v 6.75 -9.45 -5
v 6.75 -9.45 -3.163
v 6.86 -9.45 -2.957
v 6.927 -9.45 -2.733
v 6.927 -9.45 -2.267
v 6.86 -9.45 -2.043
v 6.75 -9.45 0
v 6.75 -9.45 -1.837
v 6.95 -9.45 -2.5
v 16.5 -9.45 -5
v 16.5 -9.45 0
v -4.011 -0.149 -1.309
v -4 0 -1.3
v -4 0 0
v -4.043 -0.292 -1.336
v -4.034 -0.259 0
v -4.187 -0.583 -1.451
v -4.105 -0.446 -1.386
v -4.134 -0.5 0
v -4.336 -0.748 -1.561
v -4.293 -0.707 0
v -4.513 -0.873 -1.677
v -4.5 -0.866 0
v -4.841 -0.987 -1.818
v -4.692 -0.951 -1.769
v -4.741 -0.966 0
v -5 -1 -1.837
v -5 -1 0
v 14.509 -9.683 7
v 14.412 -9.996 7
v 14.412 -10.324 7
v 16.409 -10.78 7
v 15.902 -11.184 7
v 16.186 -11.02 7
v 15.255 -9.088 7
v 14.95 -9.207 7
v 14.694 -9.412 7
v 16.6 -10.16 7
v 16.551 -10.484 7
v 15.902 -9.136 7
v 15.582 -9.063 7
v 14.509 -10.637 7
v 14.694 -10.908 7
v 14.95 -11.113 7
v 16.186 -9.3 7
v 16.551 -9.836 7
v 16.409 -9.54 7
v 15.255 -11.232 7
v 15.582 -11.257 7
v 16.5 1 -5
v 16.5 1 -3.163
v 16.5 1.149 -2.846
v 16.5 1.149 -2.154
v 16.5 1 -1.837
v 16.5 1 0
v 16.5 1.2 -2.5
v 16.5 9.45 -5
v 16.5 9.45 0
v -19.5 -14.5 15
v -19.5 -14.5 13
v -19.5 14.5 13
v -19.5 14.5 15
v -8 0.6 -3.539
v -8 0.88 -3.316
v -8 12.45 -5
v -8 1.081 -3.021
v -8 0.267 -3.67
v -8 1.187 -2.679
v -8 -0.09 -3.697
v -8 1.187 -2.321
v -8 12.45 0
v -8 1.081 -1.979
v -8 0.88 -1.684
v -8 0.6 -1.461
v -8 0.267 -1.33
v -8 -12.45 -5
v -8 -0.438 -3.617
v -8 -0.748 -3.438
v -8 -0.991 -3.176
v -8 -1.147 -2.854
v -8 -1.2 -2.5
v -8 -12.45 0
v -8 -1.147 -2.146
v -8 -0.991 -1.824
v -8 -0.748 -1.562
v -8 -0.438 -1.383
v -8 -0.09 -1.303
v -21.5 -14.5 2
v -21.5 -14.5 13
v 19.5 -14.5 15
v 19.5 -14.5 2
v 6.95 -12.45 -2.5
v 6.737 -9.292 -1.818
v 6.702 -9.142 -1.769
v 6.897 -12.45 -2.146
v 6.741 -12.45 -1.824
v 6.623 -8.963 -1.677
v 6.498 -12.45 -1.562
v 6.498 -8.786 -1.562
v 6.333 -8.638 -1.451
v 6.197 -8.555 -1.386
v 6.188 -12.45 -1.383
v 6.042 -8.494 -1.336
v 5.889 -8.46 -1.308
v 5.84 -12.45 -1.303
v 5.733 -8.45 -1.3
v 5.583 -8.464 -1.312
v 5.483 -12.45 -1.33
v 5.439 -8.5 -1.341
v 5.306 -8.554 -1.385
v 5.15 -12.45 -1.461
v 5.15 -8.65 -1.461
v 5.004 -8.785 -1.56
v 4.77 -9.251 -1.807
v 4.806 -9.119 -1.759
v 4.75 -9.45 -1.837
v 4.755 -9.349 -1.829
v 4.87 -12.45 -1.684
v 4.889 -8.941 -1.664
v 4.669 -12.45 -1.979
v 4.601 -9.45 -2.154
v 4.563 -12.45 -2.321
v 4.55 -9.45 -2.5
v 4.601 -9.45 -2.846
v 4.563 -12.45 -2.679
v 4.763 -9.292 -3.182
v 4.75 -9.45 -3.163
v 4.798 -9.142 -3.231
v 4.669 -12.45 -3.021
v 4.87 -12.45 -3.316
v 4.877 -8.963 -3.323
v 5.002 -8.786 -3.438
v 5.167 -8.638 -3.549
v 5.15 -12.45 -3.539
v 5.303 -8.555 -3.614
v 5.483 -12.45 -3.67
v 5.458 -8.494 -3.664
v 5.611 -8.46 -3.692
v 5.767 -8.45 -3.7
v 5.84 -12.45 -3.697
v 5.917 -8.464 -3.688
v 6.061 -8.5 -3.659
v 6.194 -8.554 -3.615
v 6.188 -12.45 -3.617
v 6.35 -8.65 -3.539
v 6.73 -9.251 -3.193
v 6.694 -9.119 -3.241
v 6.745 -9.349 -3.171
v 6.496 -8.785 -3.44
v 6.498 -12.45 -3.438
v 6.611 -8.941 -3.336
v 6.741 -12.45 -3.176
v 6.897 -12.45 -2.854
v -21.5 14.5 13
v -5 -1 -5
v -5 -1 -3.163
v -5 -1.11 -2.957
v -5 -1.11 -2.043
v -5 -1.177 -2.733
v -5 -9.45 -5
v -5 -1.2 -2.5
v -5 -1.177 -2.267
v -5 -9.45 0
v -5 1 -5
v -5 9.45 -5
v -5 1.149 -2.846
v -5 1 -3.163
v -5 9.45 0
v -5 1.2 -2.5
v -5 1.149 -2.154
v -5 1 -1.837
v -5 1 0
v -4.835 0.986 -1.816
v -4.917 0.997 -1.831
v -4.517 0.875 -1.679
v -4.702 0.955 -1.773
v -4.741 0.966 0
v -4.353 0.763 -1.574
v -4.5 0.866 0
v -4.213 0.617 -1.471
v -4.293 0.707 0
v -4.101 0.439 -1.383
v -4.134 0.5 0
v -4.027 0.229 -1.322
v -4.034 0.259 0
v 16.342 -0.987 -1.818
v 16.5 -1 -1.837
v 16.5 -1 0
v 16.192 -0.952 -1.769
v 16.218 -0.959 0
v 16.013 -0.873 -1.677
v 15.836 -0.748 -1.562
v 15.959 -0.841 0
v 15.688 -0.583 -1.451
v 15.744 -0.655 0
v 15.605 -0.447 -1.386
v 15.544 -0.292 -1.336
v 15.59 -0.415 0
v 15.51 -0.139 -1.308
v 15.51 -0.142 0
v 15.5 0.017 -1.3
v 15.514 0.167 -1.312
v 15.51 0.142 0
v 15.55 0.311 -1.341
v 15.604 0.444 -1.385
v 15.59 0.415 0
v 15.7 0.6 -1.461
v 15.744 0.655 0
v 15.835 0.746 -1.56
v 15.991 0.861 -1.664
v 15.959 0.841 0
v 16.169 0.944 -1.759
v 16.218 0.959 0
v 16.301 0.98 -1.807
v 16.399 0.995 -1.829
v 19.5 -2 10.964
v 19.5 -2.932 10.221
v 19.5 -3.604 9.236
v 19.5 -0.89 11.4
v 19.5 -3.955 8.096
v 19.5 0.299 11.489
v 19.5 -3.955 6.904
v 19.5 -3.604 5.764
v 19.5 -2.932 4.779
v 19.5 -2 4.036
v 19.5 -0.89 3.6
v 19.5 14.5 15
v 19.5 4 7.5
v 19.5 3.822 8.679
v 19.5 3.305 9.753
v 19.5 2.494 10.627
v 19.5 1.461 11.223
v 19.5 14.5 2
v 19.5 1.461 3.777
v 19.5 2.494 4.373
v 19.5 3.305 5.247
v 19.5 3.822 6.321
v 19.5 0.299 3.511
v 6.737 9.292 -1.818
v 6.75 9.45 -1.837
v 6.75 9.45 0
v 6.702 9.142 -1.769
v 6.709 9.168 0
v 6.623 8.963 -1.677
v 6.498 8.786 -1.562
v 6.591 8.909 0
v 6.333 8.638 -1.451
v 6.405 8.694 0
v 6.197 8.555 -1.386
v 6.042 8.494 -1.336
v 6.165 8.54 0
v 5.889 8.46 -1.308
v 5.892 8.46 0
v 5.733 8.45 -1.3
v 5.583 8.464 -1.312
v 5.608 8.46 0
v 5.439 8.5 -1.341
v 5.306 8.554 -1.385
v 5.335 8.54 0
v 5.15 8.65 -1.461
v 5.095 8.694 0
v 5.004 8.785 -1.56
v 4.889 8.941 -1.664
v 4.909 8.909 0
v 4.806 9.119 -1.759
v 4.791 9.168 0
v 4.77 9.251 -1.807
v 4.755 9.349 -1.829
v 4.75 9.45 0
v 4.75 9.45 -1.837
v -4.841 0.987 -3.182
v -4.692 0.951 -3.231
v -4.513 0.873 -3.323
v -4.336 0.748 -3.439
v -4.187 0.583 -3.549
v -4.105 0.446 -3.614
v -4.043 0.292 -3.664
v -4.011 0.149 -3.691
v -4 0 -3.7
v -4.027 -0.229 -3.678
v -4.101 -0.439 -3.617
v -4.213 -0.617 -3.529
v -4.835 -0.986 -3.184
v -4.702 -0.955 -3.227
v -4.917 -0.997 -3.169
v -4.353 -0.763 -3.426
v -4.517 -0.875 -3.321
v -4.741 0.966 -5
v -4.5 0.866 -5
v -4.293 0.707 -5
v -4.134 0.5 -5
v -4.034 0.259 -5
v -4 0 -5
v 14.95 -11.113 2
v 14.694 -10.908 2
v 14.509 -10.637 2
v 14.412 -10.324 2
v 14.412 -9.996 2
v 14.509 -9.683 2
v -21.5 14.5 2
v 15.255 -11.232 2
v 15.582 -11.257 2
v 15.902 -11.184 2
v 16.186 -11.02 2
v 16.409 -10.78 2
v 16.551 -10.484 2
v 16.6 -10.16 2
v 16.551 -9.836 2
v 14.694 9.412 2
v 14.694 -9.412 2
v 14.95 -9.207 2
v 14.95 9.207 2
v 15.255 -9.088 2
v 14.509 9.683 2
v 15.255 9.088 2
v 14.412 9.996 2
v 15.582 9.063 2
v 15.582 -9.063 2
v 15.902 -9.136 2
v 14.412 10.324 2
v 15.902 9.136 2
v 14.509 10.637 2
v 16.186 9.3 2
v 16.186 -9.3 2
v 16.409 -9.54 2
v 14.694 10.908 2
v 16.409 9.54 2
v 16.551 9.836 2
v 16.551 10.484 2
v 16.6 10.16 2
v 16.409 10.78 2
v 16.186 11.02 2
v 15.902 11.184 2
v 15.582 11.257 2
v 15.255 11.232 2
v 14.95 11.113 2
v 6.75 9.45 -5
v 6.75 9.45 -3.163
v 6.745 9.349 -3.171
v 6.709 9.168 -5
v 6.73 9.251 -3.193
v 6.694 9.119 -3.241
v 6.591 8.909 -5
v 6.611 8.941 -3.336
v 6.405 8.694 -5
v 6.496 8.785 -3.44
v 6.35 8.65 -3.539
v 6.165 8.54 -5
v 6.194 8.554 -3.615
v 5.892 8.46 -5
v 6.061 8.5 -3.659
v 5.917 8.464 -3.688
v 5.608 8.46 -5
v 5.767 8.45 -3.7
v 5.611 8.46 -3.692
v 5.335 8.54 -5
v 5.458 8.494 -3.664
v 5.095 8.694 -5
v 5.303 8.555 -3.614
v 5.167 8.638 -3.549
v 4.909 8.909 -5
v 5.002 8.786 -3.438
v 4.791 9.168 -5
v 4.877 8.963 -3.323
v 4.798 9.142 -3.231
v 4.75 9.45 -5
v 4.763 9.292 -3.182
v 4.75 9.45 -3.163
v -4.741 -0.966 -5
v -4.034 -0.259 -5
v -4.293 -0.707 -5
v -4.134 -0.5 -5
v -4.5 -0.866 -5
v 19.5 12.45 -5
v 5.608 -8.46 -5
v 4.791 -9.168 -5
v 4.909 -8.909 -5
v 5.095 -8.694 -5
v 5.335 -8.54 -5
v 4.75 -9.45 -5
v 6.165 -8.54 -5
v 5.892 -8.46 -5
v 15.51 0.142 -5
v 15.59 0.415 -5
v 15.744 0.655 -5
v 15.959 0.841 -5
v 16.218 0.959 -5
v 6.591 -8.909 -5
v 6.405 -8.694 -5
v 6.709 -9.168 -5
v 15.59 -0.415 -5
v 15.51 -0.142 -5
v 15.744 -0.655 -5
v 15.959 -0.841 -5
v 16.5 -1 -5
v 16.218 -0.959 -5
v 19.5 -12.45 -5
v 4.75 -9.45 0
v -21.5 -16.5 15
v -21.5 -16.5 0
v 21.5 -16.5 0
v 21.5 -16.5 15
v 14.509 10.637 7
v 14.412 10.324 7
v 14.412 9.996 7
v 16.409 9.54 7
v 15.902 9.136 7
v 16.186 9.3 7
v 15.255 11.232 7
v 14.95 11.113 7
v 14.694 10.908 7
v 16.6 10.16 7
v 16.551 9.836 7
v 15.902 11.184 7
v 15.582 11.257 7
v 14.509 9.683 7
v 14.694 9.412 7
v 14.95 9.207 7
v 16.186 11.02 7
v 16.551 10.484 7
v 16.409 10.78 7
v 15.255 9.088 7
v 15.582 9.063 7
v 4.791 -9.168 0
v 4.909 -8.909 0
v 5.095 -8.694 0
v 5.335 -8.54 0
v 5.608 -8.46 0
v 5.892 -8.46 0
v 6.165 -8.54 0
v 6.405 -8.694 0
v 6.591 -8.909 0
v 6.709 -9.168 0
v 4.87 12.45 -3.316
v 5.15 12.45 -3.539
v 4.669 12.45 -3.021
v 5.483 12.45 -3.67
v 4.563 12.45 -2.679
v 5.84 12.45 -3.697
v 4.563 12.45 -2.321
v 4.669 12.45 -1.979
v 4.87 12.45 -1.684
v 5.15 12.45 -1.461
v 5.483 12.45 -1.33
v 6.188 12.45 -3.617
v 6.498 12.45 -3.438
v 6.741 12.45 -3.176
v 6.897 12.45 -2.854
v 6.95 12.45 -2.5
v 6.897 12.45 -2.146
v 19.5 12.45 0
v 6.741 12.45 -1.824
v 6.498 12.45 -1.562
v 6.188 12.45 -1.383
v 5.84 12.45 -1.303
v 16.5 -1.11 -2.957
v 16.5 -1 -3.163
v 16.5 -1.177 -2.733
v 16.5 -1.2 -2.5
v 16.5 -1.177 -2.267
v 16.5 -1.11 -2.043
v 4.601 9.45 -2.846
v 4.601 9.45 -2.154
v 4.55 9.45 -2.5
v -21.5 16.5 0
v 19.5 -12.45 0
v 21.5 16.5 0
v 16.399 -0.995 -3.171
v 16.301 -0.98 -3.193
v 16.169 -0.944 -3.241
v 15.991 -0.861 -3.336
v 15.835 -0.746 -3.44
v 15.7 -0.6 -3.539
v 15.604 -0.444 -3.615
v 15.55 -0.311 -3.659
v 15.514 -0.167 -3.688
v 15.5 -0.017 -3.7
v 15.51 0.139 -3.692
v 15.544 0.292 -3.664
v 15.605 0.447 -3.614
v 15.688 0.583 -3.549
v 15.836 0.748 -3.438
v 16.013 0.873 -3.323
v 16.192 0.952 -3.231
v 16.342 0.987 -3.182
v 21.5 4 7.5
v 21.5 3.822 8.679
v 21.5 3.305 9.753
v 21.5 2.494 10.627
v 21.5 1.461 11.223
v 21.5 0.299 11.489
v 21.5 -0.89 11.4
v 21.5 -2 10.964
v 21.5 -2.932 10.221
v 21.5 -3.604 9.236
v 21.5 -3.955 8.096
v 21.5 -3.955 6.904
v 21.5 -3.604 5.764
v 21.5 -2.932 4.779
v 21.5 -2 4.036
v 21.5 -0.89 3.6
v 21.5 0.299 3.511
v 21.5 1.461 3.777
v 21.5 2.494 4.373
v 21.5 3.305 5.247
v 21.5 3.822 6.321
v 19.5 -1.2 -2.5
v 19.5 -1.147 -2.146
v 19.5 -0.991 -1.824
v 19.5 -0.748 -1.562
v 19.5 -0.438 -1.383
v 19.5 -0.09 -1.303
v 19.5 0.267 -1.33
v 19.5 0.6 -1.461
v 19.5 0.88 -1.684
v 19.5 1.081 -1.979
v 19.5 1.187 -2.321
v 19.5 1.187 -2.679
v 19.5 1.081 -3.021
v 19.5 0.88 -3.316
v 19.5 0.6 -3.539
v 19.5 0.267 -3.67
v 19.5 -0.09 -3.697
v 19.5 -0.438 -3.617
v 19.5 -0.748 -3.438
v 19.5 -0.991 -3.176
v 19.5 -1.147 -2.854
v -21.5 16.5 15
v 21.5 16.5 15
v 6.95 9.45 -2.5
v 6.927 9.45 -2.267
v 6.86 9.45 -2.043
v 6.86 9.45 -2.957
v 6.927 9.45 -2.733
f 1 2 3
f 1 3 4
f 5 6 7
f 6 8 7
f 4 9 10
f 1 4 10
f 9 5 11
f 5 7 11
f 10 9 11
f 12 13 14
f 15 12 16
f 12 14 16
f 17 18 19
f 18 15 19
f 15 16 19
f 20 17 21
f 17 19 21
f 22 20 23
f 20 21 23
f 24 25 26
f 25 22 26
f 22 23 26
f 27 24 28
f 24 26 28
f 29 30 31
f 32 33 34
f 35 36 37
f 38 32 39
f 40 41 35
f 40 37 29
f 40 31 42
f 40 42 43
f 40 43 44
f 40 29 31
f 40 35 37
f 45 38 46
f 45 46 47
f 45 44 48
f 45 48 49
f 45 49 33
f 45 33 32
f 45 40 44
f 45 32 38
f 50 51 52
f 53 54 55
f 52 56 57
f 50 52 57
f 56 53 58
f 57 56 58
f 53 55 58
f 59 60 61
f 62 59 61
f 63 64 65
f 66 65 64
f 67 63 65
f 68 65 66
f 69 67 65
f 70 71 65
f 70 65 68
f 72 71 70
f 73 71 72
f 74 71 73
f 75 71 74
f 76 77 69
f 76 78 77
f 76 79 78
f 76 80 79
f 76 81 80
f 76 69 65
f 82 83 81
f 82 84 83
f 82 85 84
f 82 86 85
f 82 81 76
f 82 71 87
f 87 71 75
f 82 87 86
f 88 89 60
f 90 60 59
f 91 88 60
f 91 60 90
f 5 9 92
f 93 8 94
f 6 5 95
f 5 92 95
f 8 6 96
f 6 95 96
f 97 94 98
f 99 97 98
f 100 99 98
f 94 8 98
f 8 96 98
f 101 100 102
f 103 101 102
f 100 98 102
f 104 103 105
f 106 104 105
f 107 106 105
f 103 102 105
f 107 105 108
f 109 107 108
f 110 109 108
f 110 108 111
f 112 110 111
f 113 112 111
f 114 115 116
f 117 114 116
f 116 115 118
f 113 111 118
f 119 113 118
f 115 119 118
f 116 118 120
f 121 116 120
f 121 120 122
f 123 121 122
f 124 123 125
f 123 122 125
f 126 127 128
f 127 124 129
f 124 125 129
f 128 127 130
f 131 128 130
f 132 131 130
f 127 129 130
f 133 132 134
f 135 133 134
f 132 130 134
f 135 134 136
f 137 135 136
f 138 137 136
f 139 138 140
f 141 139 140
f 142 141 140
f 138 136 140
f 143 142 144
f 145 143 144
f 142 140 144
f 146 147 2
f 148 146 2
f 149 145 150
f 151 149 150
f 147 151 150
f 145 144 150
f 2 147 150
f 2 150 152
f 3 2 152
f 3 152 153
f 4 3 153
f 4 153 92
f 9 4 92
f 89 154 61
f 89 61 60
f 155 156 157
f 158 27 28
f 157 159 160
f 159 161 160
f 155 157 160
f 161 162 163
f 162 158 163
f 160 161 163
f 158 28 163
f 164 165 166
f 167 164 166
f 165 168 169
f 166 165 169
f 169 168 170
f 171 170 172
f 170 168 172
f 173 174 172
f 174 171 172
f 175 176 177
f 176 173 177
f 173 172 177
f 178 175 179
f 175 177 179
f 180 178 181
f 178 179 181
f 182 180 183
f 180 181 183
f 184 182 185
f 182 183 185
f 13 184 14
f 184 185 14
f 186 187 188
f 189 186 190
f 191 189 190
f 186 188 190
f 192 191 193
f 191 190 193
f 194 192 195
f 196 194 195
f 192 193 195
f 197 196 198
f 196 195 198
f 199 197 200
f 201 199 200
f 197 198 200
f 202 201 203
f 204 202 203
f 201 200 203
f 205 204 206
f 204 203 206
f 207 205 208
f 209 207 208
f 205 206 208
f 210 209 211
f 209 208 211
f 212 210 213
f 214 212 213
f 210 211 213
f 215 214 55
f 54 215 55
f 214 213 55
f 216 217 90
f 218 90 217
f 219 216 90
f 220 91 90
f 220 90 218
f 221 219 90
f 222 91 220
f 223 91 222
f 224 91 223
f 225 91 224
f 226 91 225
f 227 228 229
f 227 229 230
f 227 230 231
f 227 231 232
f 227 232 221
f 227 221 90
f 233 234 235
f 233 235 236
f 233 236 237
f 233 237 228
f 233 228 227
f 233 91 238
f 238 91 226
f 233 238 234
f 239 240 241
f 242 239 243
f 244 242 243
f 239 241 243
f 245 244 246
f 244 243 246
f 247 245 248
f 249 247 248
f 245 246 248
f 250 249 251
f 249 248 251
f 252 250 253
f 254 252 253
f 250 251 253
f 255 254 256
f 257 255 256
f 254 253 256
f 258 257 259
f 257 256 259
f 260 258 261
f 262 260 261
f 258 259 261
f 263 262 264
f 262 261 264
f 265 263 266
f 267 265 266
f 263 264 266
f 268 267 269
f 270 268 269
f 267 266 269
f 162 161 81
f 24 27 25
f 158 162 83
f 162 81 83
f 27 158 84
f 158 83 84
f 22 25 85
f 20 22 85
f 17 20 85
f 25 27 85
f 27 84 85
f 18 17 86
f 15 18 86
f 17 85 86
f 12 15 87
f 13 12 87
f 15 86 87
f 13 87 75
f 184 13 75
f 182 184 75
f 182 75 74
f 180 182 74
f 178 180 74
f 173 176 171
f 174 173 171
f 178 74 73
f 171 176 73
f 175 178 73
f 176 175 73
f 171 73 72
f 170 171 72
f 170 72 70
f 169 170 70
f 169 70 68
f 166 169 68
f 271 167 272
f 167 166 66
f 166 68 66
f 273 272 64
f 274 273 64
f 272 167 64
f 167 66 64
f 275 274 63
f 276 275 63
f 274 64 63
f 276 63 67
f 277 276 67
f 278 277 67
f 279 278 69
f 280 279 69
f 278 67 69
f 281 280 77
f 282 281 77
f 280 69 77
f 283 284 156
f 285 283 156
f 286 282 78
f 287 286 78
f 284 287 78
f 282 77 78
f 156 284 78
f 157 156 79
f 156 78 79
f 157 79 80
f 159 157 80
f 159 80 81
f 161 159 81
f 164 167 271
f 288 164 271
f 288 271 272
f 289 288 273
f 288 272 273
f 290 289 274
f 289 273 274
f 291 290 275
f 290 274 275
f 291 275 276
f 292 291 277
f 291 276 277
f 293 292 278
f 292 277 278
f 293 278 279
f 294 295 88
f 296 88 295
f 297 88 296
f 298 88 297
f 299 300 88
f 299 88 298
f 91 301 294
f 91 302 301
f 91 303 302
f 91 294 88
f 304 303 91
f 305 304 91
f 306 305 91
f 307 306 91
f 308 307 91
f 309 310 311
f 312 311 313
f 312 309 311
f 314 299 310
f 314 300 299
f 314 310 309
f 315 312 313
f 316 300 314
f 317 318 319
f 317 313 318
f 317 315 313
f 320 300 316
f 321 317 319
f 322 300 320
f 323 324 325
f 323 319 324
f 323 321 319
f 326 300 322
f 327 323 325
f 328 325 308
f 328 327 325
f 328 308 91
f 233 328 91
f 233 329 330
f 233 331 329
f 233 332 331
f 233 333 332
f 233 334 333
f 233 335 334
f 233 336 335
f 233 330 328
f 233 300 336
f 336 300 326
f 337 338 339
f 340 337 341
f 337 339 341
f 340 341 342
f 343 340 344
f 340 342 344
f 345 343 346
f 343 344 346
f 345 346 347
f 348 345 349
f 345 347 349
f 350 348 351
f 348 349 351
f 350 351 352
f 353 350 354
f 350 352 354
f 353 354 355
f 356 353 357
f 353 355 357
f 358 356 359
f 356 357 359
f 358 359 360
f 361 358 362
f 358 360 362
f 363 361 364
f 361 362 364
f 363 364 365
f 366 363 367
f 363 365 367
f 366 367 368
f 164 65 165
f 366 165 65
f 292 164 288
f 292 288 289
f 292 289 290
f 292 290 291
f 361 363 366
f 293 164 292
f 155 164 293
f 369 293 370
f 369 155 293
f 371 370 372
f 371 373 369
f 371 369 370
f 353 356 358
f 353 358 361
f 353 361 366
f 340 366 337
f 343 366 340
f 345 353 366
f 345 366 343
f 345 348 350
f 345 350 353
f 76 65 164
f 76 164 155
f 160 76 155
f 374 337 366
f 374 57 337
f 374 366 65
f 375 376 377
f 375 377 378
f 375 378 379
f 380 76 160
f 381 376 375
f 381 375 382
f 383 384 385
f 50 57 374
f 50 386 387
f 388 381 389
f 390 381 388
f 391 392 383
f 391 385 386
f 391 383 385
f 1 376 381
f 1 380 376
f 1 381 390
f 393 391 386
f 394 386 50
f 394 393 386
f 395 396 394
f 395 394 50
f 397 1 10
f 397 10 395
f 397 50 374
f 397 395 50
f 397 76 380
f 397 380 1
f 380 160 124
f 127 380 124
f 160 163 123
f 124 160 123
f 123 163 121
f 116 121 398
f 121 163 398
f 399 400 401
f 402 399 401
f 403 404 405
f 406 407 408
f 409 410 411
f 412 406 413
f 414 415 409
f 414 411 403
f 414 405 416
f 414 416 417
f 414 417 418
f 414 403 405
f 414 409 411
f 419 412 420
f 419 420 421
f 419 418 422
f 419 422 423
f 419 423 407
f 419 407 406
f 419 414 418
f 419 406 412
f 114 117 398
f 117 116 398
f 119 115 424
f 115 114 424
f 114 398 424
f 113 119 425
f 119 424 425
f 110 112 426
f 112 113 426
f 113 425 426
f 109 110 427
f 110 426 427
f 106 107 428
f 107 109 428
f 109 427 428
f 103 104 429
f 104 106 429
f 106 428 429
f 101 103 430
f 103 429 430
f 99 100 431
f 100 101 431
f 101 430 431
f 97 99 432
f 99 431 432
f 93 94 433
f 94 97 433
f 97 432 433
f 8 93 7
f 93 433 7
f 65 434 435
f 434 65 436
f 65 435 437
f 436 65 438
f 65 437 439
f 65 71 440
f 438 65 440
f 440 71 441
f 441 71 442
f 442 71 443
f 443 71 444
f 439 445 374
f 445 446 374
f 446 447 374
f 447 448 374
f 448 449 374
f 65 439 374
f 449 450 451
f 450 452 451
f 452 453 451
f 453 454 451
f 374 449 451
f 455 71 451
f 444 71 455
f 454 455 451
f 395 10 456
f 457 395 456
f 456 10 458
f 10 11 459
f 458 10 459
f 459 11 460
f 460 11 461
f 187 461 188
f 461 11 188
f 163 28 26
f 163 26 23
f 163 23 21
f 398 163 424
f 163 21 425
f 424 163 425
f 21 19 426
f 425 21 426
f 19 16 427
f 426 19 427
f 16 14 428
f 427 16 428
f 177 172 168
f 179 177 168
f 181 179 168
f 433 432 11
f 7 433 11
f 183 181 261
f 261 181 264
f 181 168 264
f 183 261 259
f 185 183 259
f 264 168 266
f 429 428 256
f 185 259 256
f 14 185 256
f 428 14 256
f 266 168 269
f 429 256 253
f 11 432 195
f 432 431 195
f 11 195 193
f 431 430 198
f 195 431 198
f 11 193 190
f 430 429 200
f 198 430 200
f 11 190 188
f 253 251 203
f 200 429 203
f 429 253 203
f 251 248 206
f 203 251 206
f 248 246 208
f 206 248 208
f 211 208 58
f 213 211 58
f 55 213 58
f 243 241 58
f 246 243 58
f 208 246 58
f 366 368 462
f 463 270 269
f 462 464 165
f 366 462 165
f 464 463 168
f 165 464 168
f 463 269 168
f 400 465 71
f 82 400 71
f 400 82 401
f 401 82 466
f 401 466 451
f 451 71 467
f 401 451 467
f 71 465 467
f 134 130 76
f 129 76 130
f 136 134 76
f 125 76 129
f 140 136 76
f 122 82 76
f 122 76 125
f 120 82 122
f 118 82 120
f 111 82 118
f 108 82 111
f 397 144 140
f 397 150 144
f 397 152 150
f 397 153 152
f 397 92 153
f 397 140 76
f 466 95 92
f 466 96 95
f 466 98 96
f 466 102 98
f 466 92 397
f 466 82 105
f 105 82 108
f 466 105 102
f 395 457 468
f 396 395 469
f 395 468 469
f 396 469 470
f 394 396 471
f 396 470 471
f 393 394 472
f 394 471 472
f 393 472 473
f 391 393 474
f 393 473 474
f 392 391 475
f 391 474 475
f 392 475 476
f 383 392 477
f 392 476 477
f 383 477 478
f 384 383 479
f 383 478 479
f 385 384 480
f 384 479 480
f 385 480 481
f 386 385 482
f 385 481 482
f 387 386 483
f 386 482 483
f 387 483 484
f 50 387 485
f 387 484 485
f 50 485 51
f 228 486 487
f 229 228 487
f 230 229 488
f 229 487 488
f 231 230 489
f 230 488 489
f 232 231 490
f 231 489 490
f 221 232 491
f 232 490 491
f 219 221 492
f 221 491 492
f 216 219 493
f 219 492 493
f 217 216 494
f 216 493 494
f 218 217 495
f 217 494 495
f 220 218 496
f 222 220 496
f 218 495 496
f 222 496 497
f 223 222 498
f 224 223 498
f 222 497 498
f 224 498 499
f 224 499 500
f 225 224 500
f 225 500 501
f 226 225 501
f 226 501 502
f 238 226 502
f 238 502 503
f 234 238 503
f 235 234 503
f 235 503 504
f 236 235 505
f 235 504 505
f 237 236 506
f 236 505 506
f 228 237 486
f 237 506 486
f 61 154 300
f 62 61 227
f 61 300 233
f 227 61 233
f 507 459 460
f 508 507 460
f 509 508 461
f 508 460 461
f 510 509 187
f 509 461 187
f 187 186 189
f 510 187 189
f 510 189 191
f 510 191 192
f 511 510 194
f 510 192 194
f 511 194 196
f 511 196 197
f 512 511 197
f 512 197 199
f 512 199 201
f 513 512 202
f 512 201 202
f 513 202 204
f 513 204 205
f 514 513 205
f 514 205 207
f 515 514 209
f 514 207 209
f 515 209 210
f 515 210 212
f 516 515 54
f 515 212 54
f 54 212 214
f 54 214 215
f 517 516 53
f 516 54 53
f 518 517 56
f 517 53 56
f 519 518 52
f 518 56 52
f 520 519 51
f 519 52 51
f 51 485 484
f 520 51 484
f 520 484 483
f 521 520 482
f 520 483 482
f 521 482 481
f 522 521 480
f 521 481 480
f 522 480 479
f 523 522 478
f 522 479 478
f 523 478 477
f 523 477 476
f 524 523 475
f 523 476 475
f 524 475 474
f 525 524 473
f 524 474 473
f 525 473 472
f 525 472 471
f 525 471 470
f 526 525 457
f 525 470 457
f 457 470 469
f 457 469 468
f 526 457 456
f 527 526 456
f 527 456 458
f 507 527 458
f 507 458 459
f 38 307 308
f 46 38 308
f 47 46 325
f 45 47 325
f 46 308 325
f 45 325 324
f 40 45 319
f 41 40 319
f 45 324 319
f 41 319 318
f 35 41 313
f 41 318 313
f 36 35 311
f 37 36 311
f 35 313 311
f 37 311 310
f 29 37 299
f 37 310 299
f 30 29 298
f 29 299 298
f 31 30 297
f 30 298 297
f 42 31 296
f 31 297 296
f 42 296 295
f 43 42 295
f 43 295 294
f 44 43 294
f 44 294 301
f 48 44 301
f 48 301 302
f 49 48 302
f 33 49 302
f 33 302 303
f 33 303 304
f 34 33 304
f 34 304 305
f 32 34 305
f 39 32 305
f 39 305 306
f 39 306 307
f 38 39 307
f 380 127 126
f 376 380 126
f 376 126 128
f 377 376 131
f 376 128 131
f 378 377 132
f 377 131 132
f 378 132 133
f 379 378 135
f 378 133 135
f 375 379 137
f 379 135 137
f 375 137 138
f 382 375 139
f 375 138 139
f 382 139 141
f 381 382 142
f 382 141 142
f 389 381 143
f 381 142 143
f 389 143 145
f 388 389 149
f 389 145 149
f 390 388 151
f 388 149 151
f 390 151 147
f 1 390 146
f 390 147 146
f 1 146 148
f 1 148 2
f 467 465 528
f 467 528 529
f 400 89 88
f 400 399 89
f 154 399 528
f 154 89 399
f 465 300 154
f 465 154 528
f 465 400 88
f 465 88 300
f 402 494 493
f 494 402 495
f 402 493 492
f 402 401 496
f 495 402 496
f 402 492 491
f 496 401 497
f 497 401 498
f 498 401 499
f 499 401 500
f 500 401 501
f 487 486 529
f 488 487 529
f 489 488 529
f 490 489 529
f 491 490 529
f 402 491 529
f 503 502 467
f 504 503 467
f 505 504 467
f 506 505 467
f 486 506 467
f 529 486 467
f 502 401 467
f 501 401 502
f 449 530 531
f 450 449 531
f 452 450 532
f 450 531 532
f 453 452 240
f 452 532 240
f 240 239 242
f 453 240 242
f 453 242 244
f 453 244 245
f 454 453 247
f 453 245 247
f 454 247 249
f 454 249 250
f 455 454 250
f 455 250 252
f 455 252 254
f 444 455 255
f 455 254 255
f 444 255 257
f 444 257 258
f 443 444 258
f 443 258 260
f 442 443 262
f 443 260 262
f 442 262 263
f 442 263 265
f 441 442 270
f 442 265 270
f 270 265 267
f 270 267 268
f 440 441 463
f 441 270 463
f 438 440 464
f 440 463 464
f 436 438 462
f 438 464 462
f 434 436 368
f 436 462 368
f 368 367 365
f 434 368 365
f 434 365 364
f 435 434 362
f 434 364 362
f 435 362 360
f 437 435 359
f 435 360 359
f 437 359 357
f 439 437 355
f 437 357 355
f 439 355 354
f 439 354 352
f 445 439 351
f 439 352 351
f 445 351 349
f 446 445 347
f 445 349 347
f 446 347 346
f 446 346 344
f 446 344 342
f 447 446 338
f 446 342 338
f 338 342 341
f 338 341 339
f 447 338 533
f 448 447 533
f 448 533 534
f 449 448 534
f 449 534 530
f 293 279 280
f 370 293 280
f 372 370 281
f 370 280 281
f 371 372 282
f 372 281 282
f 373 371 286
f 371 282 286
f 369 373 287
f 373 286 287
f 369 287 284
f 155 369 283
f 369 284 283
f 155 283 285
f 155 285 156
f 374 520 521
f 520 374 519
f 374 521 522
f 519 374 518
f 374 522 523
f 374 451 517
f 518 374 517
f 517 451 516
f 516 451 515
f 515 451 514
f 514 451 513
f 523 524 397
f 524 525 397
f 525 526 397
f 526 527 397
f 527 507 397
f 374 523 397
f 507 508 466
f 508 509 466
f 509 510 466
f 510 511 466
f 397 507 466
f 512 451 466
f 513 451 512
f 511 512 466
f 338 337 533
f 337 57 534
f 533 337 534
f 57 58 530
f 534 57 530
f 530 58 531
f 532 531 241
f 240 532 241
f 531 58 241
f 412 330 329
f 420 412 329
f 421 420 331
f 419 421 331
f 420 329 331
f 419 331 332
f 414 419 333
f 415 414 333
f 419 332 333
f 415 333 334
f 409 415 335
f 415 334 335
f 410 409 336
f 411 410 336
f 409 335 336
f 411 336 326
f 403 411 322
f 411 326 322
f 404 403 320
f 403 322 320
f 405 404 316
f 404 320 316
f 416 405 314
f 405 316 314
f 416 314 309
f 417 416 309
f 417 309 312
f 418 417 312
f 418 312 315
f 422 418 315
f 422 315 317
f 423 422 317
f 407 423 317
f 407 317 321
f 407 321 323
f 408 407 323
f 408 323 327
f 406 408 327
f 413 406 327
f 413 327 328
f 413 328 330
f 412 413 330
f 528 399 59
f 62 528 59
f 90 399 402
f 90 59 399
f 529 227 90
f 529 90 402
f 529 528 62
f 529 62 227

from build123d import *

# Parameters (mm, degrees)
F0_W     = 43
F0_H     = 33
F0_W_2   = 39
F0_H_2   = 29
F1_DEPTH = 15
F0_R     = 1.1
F2_DEPTH = 2
F3_DEPTH = 7
F4_R     = 4
F5_DEPTH = 2
F6_W     = 29
F6_H     = 11
F7_DEPTH = 2
F8_W     = 27.5
F8_H     = 24.9
F9_DEPTH = 5
F11_D    = 2.4
F13_D    = 2.4


with BuildPart() as f1:
    # F0 (on Top) → F1 (new body)
    with BuildSketch(Plane.XY):
        Rectangle(F0_W, F0_H)
        Rectangle(F0_W_2, F0_H_2, mode=Mode.SUBTRACT)
    extrude(amount=F1_DEPTH)

    # F0 (on Top) → F2 (join)
    with BuildSketch(Plane.XY):
        Rectangle(F0_W_2, F0_H_2)
        with Locations((15.5, -10.16)):
            Circle(F0_R, mode=Mode.SUBTRACT)
        with Locations((15.5, 10.16)):
            Circle(F0_R, mode=Mode.SUBTRACT)
    extrude(amount=F2_DEPTH)

    # F0 (on Top) → F3 (join)
    with BuildSketch(Plane.XY):
        with Locations((15.5, -10.16)):
            Circle(F0_R)
        with Locations((15.5, 10.16)):
            Circle(F0_R)
    extrude(amount=F3_DEPTH)

    # F4 (on face) → F5 (cut, through all)
    with BuildSketch(Plane.YZ.offset(21.5)):
        with Locations((0, 7.5)):
            Circle(F4_R)
    extrude(amount=-F5_DEPTH, mode=Mode.SUBTRACT)

    # F6 (on face) → F7 (cut, through all)
    with BuildSketch(Plane(origin=(-21.5, 0, 0), x_dir=(0, -1, 0), z_dir=(-1, 0, 0))):
        with Locations((0, 7.5)):
            Rectangle(F6_W, F6_H)
    extrude(amount=-F7_DEPTH, mode=Mode.SUBTRACT)

    # F8 (on face) → F9 (join)
    with BuildSketch(Plane(origin=(0, 0, 0), x_dir=(1, 0, 0), z_dir=(0, 0, -1))):
        with Locations((5.75, 0)):
            Rectangle(F8_W, F8_H)
        with BuildLine():
            Line((6.75, 9.45), (16.5, 9.45))
            Line((16.5, 9.45), (16.5, 1))
            ThreePointArc((16.5, 1), (17.2071067812, 0.7071067812), (17.5, 0))
            ThreePointArc((17.5, 0), (17.2071067812, -0.7071067812), (16.5, -1))
            Line((16.5, -1), (16.5, -9.45))
            Line((16.5, -9.45), (6.75, -9.45))
            ThreePointArc((6.75, -9.45), (5.75, -10.45), (4.75, -9.45))
            Line((4.75, -9.45), (-5, -9.45))
            Line((-5, -9.45), (-5, -1))
            ThreePointArc((-5, -1), (-6, 0), (-5, 1))
            Line((-5, 1), (-5, 9.45))
            Line((-5, 9.45), (4.75, 9.45))
            ThreePointArc((4.75, 9.45), (5.75, 10.45), (6.75, 9.45))
        make_face(mode=Mode.SUBTRACT)
        with BuildLine():
            ThreePointArc((17.5, 0), (17.2071067812, 0.7071067812), (16.5, 1))
            Line((16.5, 1), (16.5, -1))
            ThreePointArc((16.5, -1), (17.2071067812, -0.7071067812), (17.5, 0))
        make_face()
        with BuildLine():
            Line((16.5, -1), (16.5, 1))
            ThreePointArc((16.5, 1), (15.5, 0), (16.5, -1))
        make_face()
        with BuildLine():
            Line((4.75, -9.45), (6.75, -9.45))
            ThreePointArc((6.75, -9.45), (5.75, -8.45), (4.75, -9.45))
        make_face()
        with BuildLine():
            ThreePointArc((4.75, -9.45), (5.75, -10.45), (6.75, -9.45))
            Line((6.75, -9.45), (4.75, -9.45))
        make_face()
        with BuildLine():
            ThreePointArc((4.75, 9.45), (5.75, 8.45), (6.75, 9.45))
            Line((6.75, 9.45), (4.75, 9.45))
        make_face()
        with BuildLine():
            Line((4.75, 9.45), (6.75, 9.45))
            ThreePointArc((6.75, 9.45), (5.75, 10.45), (4.75, 9.45))
        make_face()
        with BuildLine():
            ThreePointArc((-4, 0), (-4.2928932188, 0.7071067812), (-5, 1))
            Line((-5, 1), (-5, -1))
            ThreePointArc((-5, -1), (-4.2928932188, -0.7071067812), (-4, 0))
        make_face()
        with BuildLine():
            Line((-5, -1), (-5, 1))
            ThreePointArc((-5, 1), (-6, 0), (-5, -1))
        make_face()
    extrude(amount=F9_DEPTH)

    # F11 (through all)
    with Locations(Plane.YZ.offset(19.5)):
        with Locations((0, -2.5)):
            Hole(F11_D / 2)

    # F13 (through all)
    with Locations(Plane(origin=(0, 12.45, 0), x_dir=(-1, 0, 0), z_dir=(0, 1, 0))):
        with Locations((-5.75, -2.5)):
            Hole(F13_D / 2)


solid = f1.part
